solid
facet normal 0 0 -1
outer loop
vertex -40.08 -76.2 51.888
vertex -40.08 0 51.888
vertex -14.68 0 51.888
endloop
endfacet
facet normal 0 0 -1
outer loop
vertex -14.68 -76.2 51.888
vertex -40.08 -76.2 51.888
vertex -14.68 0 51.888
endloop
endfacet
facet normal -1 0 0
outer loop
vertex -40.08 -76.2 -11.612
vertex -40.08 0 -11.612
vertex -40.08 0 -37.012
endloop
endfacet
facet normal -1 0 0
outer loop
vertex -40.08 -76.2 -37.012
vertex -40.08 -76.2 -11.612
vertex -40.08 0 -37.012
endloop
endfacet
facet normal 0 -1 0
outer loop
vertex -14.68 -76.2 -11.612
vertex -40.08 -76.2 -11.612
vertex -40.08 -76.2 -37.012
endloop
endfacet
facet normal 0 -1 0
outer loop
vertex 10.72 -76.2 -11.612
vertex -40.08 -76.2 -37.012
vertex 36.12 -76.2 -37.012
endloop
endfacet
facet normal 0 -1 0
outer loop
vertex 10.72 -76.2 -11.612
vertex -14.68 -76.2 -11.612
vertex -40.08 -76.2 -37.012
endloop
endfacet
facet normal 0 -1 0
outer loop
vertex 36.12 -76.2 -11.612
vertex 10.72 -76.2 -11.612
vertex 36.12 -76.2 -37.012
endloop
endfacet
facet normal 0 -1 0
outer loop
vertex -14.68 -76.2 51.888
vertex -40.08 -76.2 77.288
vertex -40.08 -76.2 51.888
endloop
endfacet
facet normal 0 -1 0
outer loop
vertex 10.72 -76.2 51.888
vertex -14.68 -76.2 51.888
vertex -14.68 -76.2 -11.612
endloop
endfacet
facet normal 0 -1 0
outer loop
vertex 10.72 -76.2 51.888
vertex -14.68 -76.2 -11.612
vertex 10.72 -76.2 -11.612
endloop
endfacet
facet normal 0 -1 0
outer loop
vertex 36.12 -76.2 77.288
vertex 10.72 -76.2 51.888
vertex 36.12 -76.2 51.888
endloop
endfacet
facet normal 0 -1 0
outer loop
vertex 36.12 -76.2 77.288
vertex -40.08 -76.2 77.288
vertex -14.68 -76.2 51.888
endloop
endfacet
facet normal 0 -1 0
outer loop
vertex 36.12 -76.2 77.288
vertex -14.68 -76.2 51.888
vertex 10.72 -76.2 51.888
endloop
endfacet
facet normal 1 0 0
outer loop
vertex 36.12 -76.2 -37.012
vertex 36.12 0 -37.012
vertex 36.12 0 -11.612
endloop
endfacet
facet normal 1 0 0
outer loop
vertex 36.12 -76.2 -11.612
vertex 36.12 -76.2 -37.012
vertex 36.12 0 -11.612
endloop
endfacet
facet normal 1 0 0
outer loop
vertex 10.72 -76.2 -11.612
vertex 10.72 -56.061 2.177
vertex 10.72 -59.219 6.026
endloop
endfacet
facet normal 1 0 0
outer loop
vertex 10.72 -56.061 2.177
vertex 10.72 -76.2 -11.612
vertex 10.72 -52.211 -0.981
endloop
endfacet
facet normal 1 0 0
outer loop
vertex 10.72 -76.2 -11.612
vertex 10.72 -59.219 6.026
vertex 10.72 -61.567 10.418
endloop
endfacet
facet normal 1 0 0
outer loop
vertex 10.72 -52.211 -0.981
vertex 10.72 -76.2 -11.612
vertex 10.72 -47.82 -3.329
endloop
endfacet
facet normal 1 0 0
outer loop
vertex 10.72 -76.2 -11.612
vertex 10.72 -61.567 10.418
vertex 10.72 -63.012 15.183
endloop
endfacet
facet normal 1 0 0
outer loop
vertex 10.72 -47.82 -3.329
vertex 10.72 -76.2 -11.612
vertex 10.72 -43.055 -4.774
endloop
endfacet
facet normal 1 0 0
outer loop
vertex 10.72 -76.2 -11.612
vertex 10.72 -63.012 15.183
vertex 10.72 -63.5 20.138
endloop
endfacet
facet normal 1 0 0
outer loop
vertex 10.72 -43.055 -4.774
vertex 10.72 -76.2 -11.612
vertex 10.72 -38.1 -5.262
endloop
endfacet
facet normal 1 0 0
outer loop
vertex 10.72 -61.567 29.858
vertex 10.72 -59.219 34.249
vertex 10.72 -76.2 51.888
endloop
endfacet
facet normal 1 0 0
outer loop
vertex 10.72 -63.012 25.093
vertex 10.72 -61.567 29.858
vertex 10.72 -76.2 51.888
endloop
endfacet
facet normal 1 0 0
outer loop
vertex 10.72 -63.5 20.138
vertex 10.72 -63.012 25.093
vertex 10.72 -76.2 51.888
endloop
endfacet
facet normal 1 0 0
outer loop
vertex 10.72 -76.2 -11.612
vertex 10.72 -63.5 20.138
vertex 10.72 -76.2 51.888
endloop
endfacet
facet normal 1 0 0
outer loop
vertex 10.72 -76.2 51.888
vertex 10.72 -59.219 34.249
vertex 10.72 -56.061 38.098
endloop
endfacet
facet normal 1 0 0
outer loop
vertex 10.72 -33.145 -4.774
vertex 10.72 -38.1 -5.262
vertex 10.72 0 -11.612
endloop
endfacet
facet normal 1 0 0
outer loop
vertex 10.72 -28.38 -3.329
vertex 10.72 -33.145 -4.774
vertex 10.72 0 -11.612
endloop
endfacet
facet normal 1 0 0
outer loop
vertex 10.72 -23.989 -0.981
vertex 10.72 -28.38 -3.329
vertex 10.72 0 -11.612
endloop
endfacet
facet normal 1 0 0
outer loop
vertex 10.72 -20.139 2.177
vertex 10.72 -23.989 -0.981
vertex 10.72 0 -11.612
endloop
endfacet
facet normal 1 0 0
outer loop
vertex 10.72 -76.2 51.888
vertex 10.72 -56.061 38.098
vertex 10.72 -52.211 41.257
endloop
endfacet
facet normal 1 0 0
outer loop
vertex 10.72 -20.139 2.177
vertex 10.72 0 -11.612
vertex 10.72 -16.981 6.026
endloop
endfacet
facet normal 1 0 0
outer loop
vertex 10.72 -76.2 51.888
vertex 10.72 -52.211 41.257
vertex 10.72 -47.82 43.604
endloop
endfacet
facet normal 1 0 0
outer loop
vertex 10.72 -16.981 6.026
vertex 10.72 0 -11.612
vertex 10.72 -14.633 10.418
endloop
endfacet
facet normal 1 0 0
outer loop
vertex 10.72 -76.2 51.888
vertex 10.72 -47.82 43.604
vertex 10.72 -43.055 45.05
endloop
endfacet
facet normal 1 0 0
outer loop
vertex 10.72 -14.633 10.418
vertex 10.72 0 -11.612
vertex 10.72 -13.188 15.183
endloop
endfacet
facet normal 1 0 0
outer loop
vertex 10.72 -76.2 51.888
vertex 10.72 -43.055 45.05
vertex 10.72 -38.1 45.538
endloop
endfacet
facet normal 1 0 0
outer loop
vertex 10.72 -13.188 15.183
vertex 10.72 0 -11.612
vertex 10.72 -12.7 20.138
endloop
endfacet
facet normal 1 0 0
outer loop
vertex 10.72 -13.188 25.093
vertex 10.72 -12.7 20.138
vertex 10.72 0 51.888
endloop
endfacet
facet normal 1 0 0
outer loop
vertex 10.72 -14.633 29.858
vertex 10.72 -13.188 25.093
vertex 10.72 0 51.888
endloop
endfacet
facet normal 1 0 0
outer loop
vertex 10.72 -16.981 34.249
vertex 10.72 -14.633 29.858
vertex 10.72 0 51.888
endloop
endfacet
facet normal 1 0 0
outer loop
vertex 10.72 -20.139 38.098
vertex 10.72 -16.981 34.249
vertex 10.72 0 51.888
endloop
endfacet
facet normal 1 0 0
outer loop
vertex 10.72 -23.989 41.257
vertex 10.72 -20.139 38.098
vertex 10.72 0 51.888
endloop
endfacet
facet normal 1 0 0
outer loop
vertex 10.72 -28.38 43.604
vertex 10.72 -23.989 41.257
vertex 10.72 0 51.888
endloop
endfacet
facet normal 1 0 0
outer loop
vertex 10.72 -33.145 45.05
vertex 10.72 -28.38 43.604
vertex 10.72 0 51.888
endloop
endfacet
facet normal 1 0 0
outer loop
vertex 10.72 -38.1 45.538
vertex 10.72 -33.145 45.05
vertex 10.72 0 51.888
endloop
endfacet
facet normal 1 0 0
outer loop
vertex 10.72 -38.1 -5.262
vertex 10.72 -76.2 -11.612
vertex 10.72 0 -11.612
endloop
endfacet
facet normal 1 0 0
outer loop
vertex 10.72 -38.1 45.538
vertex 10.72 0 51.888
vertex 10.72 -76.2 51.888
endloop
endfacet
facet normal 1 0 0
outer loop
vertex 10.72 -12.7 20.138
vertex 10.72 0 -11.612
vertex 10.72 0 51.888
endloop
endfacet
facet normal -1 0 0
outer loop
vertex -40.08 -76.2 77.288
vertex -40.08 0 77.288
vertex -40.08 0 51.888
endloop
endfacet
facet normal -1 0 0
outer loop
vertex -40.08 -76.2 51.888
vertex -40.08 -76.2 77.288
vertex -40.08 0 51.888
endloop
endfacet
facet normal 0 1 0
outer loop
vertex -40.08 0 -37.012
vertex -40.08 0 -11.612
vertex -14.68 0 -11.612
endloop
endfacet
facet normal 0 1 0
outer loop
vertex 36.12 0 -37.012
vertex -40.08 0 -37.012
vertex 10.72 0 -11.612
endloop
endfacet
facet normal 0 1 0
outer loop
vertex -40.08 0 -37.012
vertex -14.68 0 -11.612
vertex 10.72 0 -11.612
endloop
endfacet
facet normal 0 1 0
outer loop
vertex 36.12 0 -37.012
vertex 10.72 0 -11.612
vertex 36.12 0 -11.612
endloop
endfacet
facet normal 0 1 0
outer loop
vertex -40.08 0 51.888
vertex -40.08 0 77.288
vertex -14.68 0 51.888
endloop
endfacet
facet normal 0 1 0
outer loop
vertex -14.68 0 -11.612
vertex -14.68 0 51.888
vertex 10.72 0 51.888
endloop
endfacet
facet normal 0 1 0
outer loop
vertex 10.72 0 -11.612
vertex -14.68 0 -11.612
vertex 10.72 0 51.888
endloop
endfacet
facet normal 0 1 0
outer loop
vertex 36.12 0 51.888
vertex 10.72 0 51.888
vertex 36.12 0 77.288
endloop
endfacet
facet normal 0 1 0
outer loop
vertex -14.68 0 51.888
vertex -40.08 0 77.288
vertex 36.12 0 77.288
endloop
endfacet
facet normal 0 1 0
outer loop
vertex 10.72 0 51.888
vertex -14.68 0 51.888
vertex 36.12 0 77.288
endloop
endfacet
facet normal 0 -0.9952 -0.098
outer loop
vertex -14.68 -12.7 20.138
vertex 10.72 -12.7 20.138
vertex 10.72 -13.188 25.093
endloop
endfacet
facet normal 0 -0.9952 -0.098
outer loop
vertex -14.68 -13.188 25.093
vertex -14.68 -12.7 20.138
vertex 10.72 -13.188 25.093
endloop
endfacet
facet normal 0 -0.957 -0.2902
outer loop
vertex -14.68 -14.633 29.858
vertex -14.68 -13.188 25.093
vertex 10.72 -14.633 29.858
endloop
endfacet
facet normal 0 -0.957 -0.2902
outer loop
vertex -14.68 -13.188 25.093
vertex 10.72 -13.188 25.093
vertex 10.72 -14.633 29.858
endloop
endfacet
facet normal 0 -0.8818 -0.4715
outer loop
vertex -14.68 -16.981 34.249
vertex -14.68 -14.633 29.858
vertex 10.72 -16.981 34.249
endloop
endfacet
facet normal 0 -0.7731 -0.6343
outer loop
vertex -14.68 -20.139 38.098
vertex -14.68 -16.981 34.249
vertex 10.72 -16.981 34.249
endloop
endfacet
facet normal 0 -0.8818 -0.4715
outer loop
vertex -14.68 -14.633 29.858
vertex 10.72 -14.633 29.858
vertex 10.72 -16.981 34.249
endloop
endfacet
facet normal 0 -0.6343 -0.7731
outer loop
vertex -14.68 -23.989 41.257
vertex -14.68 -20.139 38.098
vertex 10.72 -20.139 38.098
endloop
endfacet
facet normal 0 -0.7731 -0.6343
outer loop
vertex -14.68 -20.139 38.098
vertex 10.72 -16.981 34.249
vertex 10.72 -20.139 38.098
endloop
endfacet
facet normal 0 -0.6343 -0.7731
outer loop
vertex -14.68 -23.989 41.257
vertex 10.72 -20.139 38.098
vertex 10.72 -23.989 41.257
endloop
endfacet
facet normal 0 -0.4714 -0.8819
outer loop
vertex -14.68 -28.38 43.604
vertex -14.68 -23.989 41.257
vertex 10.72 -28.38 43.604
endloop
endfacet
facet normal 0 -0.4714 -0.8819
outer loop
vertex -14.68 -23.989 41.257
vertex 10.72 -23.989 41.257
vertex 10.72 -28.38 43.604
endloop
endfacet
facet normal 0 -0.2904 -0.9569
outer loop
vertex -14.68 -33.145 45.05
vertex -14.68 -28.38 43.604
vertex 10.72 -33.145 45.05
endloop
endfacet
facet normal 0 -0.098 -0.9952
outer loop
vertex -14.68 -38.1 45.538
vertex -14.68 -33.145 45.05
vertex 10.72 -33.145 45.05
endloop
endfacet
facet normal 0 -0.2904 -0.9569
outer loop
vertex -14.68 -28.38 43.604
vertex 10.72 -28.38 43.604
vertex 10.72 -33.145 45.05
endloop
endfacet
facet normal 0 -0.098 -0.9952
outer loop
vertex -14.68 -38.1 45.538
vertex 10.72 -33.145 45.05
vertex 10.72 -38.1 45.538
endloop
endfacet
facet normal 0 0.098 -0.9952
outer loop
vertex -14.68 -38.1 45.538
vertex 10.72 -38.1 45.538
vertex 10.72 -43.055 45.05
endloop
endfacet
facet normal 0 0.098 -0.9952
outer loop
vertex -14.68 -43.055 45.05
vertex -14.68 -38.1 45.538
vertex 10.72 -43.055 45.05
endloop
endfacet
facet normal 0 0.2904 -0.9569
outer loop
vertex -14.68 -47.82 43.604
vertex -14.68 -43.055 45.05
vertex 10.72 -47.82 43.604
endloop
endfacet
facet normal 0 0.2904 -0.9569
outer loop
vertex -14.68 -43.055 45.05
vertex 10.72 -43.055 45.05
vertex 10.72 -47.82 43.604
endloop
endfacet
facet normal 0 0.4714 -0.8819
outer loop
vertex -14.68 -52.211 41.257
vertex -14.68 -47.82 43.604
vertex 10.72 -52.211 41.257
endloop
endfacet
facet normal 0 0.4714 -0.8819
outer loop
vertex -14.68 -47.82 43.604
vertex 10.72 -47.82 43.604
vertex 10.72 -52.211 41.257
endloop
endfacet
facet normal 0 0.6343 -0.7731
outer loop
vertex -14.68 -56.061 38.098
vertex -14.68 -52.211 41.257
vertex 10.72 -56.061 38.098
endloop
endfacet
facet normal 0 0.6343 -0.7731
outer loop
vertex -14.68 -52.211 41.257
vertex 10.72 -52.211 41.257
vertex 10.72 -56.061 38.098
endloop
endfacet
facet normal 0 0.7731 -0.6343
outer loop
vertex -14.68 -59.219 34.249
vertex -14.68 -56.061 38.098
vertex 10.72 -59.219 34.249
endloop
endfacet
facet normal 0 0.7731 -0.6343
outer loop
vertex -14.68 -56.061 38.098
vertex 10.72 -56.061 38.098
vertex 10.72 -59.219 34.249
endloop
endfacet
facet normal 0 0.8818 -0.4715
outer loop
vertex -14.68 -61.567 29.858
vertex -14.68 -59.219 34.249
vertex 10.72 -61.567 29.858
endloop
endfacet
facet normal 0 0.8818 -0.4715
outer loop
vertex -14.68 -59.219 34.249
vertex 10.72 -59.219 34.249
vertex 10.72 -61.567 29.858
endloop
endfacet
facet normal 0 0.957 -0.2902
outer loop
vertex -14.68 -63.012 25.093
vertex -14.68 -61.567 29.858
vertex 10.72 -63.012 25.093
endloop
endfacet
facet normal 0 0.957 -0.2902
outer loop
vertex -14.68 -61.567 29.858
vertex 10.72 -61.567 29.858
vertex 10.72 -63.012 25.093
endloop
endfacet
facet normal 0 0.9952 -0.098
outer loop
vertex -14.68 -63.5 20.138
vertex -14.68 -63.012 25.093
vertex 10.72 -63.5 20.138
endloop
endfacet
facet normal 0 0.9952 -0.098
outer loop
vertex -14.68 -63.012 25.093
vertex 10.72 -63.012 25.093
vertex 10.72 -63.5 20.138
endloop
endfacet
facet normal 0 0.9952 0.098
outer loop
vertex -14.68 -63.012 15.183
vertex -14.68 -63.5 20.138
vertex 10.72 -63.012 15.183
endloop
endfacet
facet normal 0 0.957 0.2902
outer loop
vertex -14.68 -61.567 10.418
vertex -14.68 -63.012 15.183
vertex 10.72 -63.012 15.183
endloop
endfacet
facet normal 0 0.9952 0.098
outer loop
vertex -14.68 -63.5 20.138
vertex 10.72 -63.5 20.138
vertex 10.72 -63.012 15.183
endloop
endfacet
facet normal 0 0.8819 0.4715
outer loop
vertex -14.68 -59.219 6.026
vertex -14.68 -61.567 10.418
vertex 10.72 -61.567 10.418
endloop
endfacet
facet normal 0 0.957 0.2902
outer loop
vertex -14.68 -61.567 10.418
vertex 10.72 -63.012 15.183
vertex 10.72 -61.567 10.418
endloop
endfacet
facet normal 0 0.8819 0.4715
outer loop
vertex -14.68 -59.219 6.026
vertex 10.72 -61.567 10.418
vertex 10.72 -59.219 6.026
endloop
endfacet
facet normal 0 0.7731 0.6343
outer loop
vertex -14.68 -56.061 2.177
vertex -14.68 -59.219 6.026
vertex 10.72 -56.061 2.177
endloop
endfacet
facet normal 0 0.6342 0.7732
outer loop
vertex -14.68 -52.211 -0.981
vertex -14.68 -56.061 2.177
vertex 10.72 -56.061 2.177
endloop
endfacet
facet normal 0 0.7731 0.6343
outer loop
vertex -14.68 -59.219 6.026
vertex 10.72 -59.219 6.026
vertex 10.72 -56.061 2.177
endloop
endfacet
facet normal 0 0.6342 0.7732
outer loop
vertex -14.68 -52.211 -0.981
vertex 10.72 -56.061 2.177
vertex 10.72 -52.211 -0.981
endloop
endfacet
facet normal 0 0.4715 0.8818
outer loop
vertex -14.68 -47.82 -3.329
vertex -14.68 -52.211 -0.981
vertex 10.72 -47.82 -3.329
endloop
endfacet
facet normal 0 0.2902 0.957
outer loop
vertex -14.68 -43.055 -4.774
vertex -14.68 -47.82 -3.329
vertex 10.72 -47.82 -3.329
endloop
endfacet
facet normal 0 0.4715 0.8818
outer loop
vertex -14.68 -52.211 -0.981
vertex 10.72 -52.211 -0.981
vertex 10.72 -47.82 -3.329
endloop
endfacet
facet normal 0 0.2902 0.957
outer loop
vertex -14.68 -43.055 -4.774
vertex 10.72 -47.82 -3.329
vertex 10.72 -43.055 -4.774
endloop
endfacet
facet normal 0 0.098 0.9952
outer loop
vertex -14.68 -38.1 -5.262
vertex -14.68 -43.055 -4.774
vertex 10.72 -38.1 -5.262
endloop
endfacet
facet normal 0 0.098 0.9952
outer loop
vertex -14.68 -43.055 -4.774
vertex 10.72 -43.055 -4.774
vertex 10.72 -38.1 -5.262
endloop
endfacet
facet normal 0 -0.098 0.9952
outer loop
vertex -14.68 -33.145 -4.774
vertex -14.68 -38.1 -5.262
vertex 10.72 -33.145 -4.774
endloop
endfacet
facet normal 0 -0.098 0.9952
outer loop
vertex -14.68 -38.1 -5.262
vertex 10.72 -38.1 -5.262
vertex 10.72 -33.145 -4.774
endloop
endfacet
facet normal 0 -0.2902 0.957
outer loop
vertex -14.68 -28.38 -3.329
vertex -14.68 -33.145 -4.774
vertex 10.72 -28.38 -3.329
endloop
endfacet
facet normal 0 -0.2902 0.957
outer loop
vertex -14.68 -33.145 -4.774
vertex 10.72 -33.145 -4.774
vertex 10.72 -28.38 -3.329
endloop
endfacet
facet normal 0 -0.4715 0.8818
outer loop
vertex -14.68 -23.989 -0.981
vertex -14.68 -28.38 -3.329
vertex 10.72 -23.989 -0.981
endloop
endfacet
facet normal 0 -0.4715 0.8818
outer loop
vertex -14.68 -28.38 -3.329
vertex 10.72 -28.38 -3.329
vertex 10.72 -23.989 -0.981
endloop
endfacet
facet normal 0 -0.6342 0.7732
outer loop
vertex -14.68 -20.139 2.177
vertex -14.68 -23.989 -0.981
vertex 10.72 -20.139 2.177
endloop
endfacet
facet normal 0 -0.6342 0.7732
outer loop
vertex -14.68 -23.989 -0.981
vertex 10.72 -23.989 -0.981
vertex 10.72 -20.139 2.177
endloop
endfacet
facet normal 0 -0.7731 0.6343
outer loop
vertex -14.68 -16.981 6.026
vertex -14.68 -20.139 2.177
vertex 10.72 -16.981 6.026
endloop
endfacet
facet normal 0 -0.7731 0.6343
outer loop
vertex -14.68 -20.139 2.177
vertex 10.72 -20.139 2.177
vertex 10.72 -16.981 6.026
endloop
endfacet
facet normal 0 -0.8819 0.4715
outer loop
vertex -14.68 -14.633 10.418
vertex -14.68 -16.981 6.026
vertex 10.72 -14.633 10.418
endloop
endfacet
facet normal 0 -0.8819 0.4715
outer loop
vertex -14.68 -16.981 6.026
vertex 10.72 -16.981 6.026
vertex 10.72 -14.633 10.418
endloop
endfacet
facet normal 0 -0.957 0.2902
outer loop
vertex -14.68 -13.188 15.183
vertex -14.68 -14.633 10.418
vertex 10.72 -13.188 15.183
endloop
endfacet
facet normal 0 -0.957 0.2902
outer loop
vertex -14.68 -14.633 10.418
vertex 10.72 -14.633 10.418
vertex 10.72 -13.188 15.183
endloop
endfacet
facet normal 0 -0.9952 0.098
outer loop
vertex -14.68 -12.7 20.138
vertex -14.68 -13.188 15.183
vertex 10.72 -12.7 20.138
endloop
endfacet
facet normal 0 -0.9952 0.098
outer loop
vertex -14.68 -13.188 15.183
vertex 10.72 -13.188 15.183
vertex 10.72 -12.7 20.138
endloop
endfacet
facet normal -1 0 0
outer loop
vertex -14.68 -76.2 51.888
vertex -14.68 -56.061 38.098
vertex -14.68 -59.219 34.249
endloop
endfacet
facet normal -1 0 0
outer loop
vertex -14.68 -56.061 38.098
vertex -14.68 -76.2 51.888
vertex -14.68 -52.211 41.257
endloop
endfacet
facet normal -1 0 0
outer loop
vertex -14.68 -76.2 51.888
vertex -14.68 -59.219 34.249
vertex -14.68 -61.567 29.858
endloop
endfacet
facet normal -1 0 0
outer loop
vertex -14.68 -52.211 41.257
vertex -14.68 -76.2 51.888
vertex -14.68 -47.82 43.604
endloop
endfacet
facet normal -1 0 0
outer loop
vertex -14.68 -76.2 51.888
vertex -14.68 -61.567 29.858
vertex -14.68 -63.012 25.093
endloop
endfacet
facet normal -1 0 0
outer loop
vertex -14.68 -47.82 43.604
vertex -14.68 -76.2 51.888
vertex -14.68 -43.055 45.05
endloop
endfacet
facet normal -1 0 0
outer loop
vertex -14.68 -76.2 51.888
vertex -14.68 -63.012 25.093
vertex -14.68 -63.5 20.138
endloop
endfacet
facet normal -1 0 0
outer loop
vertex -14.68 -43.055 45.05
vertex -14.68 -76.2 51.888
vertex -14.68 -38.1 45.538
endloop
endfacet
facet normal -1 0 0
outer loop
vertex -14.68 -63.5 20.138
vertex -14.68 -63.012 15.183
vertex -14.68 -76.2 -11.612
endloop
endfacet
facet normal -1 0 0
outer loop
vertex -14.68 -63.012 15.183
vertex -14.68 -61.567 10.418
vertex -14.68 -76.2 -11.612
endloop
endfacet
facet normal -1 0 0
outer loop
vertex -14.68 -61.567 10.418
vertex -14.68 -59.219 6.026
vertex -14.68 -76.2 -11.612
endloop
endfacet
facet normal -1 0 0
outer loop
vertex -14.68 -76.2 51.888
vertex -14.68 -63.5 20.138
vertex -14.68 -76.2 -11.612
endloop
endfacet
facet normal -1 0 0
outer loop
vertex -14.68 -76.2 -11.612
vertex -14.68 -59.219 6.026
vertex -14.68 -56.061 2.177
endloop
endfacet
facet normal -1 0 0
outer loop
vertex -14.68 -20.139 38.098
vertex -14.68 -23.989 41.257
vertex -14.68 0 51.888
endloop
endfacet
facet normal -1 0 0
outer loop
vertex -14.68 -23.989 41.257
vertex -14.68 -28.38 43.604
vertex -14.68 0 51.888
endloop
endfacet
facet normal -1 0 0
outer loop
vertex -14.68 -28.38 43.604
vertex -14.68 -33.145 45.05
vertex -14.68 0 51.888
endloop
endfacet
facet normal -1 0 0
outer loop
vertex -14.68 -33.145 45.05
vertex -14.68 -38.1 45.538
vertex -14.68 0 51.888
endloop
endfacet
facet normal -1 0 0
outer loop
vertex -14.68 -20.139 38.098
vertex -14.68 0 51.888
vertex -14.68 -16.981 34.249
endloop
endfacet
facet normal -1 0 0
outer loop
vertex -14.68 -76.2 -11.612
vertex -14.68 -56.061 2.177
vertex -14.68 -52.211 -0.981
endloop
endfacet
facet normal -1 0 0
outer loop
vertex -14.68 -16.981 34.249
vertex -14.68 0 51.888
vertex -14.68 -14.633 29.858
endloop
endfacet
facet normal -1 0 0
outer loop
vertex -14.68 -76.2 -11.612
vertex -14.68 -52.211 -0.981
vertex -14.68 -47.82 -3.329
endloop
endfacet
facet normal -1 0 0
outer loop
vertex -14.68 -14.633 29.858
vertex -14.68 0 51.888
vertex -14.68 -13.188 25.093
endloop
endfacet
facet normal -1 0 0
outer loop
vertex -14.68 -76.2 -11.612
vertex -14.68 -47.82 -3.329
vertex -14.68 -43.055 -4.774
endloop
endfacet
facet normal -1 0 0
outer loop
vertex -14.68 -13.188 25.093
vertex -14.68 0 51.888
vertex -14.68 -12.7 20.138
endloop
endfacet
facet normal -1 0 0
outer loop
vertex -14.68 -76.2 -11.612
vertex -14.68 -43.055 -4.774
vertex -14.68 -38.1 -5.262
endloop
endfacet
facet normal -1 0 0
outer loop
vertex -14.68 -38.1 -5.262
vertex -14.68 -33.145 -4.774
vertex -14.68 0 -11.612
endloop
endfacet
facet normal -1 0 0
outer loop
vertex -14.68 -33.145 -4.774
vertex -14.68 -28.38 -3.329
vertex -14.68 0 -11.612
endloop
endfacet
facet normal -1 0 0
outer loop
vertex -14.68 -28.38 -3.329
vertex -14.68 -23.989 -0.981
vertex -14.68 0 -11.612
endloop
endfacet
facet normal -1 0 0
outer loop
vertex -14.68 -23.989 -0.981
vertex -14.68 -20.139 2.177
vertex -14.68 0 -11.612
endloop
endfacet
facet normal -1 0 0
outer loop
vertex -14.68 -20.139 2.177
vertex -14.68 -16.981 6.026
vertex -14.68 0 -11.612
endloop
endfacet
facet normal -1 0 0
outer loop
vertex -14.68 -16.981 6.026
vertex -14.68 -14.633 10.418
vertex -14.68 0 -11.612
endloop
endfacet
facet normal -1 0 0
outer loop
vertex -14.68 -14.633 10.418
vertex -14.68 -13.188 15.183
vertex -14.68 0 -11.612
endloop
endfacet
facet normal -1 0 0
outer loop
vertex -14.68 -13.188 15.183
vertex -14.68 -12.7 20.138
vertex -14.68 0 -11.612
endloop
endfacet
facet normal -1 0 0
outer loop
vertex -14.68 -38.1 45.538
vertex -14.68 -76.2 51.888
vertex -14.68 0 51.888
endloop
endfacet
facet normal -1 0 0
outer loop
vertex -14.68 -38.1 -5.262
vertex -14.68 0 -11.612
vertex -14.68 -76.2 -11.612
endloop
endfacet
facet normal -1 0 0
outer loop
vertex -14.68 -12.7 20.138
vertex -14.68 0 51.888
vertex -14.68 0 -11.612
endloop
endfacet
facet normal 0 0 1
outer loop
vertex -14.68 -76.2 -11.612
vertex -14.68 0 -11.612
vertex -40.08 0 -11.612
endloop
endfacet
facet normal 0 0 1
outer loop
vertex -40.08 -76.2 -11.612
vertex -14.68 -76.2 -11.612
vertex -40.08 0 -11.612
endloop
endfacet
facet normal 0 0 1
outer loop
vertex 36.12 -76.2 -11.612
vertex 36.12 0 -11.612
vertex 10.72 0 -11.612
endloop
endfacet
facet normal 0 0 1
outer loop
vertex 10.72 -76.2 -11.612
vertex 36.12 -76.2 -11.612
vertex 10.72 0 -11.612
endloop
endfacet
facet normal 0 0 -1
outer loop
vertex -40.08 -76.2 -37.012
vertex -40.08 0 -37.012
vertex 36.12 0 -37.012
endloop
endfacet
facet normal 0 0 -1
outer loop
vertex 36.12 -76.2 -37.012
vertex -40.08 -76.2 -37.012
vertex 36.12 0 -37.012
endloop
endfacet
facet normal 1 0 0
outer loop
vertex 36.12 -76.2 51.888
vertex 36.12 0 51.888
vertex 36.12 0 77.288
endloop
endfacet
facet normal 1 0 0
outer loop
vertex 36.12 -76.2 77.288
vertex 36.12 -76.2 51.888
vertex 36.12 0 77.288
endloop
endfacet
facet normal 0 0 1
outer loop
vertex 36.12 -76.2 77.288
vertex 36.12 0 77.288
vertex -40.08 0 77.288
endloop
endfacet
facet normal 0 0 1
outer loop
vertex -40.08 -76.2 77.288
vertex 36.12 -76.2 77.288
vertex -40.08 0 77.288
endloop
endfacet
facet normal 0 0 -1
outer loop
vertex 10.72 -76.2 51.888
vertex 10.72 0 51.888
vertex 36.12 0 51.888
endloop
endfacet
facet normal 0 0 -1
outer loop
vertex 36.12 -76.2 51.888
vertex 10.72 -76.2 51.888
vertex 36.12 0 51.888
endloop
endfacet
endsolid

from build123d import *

# Parameters (mm, degrees)
F1_DEPTH = 76.2
F2_R     = 25.4
F3_DEPTH = 25.4


with BuildPart() as f1:
    # F0 (on Front) → F1 (new body)
    with BuildSketch(Plane.XZ):
        Polygon((-40.079643, -11.612137), (-40.079643, -37.012137), (36.120357, -37.012137), (36.120357, -11.612137), (10.720357, -11.612137), (10.720357, 51.887863), (36.120357, 51.887863), (36.120357, 77.287863), (-40.079643, 77.287863), (-40.079643, 51.887863), (-14.679643, 51.887863), (-14.679643, -11.612137), align=None)
    extrude(amount=F1_DEPTH)

    # F2 (on face) → F3 (cut)
    with BuildSketch(Plane.YZ.offset(10.720357)):
        with Locations((-38.1, 20.137863)):
            Circle(F2_R)
    extrude(amount=-F3_DEPTH, mode=Mode.SUBTRACT)


solid = f1.part
